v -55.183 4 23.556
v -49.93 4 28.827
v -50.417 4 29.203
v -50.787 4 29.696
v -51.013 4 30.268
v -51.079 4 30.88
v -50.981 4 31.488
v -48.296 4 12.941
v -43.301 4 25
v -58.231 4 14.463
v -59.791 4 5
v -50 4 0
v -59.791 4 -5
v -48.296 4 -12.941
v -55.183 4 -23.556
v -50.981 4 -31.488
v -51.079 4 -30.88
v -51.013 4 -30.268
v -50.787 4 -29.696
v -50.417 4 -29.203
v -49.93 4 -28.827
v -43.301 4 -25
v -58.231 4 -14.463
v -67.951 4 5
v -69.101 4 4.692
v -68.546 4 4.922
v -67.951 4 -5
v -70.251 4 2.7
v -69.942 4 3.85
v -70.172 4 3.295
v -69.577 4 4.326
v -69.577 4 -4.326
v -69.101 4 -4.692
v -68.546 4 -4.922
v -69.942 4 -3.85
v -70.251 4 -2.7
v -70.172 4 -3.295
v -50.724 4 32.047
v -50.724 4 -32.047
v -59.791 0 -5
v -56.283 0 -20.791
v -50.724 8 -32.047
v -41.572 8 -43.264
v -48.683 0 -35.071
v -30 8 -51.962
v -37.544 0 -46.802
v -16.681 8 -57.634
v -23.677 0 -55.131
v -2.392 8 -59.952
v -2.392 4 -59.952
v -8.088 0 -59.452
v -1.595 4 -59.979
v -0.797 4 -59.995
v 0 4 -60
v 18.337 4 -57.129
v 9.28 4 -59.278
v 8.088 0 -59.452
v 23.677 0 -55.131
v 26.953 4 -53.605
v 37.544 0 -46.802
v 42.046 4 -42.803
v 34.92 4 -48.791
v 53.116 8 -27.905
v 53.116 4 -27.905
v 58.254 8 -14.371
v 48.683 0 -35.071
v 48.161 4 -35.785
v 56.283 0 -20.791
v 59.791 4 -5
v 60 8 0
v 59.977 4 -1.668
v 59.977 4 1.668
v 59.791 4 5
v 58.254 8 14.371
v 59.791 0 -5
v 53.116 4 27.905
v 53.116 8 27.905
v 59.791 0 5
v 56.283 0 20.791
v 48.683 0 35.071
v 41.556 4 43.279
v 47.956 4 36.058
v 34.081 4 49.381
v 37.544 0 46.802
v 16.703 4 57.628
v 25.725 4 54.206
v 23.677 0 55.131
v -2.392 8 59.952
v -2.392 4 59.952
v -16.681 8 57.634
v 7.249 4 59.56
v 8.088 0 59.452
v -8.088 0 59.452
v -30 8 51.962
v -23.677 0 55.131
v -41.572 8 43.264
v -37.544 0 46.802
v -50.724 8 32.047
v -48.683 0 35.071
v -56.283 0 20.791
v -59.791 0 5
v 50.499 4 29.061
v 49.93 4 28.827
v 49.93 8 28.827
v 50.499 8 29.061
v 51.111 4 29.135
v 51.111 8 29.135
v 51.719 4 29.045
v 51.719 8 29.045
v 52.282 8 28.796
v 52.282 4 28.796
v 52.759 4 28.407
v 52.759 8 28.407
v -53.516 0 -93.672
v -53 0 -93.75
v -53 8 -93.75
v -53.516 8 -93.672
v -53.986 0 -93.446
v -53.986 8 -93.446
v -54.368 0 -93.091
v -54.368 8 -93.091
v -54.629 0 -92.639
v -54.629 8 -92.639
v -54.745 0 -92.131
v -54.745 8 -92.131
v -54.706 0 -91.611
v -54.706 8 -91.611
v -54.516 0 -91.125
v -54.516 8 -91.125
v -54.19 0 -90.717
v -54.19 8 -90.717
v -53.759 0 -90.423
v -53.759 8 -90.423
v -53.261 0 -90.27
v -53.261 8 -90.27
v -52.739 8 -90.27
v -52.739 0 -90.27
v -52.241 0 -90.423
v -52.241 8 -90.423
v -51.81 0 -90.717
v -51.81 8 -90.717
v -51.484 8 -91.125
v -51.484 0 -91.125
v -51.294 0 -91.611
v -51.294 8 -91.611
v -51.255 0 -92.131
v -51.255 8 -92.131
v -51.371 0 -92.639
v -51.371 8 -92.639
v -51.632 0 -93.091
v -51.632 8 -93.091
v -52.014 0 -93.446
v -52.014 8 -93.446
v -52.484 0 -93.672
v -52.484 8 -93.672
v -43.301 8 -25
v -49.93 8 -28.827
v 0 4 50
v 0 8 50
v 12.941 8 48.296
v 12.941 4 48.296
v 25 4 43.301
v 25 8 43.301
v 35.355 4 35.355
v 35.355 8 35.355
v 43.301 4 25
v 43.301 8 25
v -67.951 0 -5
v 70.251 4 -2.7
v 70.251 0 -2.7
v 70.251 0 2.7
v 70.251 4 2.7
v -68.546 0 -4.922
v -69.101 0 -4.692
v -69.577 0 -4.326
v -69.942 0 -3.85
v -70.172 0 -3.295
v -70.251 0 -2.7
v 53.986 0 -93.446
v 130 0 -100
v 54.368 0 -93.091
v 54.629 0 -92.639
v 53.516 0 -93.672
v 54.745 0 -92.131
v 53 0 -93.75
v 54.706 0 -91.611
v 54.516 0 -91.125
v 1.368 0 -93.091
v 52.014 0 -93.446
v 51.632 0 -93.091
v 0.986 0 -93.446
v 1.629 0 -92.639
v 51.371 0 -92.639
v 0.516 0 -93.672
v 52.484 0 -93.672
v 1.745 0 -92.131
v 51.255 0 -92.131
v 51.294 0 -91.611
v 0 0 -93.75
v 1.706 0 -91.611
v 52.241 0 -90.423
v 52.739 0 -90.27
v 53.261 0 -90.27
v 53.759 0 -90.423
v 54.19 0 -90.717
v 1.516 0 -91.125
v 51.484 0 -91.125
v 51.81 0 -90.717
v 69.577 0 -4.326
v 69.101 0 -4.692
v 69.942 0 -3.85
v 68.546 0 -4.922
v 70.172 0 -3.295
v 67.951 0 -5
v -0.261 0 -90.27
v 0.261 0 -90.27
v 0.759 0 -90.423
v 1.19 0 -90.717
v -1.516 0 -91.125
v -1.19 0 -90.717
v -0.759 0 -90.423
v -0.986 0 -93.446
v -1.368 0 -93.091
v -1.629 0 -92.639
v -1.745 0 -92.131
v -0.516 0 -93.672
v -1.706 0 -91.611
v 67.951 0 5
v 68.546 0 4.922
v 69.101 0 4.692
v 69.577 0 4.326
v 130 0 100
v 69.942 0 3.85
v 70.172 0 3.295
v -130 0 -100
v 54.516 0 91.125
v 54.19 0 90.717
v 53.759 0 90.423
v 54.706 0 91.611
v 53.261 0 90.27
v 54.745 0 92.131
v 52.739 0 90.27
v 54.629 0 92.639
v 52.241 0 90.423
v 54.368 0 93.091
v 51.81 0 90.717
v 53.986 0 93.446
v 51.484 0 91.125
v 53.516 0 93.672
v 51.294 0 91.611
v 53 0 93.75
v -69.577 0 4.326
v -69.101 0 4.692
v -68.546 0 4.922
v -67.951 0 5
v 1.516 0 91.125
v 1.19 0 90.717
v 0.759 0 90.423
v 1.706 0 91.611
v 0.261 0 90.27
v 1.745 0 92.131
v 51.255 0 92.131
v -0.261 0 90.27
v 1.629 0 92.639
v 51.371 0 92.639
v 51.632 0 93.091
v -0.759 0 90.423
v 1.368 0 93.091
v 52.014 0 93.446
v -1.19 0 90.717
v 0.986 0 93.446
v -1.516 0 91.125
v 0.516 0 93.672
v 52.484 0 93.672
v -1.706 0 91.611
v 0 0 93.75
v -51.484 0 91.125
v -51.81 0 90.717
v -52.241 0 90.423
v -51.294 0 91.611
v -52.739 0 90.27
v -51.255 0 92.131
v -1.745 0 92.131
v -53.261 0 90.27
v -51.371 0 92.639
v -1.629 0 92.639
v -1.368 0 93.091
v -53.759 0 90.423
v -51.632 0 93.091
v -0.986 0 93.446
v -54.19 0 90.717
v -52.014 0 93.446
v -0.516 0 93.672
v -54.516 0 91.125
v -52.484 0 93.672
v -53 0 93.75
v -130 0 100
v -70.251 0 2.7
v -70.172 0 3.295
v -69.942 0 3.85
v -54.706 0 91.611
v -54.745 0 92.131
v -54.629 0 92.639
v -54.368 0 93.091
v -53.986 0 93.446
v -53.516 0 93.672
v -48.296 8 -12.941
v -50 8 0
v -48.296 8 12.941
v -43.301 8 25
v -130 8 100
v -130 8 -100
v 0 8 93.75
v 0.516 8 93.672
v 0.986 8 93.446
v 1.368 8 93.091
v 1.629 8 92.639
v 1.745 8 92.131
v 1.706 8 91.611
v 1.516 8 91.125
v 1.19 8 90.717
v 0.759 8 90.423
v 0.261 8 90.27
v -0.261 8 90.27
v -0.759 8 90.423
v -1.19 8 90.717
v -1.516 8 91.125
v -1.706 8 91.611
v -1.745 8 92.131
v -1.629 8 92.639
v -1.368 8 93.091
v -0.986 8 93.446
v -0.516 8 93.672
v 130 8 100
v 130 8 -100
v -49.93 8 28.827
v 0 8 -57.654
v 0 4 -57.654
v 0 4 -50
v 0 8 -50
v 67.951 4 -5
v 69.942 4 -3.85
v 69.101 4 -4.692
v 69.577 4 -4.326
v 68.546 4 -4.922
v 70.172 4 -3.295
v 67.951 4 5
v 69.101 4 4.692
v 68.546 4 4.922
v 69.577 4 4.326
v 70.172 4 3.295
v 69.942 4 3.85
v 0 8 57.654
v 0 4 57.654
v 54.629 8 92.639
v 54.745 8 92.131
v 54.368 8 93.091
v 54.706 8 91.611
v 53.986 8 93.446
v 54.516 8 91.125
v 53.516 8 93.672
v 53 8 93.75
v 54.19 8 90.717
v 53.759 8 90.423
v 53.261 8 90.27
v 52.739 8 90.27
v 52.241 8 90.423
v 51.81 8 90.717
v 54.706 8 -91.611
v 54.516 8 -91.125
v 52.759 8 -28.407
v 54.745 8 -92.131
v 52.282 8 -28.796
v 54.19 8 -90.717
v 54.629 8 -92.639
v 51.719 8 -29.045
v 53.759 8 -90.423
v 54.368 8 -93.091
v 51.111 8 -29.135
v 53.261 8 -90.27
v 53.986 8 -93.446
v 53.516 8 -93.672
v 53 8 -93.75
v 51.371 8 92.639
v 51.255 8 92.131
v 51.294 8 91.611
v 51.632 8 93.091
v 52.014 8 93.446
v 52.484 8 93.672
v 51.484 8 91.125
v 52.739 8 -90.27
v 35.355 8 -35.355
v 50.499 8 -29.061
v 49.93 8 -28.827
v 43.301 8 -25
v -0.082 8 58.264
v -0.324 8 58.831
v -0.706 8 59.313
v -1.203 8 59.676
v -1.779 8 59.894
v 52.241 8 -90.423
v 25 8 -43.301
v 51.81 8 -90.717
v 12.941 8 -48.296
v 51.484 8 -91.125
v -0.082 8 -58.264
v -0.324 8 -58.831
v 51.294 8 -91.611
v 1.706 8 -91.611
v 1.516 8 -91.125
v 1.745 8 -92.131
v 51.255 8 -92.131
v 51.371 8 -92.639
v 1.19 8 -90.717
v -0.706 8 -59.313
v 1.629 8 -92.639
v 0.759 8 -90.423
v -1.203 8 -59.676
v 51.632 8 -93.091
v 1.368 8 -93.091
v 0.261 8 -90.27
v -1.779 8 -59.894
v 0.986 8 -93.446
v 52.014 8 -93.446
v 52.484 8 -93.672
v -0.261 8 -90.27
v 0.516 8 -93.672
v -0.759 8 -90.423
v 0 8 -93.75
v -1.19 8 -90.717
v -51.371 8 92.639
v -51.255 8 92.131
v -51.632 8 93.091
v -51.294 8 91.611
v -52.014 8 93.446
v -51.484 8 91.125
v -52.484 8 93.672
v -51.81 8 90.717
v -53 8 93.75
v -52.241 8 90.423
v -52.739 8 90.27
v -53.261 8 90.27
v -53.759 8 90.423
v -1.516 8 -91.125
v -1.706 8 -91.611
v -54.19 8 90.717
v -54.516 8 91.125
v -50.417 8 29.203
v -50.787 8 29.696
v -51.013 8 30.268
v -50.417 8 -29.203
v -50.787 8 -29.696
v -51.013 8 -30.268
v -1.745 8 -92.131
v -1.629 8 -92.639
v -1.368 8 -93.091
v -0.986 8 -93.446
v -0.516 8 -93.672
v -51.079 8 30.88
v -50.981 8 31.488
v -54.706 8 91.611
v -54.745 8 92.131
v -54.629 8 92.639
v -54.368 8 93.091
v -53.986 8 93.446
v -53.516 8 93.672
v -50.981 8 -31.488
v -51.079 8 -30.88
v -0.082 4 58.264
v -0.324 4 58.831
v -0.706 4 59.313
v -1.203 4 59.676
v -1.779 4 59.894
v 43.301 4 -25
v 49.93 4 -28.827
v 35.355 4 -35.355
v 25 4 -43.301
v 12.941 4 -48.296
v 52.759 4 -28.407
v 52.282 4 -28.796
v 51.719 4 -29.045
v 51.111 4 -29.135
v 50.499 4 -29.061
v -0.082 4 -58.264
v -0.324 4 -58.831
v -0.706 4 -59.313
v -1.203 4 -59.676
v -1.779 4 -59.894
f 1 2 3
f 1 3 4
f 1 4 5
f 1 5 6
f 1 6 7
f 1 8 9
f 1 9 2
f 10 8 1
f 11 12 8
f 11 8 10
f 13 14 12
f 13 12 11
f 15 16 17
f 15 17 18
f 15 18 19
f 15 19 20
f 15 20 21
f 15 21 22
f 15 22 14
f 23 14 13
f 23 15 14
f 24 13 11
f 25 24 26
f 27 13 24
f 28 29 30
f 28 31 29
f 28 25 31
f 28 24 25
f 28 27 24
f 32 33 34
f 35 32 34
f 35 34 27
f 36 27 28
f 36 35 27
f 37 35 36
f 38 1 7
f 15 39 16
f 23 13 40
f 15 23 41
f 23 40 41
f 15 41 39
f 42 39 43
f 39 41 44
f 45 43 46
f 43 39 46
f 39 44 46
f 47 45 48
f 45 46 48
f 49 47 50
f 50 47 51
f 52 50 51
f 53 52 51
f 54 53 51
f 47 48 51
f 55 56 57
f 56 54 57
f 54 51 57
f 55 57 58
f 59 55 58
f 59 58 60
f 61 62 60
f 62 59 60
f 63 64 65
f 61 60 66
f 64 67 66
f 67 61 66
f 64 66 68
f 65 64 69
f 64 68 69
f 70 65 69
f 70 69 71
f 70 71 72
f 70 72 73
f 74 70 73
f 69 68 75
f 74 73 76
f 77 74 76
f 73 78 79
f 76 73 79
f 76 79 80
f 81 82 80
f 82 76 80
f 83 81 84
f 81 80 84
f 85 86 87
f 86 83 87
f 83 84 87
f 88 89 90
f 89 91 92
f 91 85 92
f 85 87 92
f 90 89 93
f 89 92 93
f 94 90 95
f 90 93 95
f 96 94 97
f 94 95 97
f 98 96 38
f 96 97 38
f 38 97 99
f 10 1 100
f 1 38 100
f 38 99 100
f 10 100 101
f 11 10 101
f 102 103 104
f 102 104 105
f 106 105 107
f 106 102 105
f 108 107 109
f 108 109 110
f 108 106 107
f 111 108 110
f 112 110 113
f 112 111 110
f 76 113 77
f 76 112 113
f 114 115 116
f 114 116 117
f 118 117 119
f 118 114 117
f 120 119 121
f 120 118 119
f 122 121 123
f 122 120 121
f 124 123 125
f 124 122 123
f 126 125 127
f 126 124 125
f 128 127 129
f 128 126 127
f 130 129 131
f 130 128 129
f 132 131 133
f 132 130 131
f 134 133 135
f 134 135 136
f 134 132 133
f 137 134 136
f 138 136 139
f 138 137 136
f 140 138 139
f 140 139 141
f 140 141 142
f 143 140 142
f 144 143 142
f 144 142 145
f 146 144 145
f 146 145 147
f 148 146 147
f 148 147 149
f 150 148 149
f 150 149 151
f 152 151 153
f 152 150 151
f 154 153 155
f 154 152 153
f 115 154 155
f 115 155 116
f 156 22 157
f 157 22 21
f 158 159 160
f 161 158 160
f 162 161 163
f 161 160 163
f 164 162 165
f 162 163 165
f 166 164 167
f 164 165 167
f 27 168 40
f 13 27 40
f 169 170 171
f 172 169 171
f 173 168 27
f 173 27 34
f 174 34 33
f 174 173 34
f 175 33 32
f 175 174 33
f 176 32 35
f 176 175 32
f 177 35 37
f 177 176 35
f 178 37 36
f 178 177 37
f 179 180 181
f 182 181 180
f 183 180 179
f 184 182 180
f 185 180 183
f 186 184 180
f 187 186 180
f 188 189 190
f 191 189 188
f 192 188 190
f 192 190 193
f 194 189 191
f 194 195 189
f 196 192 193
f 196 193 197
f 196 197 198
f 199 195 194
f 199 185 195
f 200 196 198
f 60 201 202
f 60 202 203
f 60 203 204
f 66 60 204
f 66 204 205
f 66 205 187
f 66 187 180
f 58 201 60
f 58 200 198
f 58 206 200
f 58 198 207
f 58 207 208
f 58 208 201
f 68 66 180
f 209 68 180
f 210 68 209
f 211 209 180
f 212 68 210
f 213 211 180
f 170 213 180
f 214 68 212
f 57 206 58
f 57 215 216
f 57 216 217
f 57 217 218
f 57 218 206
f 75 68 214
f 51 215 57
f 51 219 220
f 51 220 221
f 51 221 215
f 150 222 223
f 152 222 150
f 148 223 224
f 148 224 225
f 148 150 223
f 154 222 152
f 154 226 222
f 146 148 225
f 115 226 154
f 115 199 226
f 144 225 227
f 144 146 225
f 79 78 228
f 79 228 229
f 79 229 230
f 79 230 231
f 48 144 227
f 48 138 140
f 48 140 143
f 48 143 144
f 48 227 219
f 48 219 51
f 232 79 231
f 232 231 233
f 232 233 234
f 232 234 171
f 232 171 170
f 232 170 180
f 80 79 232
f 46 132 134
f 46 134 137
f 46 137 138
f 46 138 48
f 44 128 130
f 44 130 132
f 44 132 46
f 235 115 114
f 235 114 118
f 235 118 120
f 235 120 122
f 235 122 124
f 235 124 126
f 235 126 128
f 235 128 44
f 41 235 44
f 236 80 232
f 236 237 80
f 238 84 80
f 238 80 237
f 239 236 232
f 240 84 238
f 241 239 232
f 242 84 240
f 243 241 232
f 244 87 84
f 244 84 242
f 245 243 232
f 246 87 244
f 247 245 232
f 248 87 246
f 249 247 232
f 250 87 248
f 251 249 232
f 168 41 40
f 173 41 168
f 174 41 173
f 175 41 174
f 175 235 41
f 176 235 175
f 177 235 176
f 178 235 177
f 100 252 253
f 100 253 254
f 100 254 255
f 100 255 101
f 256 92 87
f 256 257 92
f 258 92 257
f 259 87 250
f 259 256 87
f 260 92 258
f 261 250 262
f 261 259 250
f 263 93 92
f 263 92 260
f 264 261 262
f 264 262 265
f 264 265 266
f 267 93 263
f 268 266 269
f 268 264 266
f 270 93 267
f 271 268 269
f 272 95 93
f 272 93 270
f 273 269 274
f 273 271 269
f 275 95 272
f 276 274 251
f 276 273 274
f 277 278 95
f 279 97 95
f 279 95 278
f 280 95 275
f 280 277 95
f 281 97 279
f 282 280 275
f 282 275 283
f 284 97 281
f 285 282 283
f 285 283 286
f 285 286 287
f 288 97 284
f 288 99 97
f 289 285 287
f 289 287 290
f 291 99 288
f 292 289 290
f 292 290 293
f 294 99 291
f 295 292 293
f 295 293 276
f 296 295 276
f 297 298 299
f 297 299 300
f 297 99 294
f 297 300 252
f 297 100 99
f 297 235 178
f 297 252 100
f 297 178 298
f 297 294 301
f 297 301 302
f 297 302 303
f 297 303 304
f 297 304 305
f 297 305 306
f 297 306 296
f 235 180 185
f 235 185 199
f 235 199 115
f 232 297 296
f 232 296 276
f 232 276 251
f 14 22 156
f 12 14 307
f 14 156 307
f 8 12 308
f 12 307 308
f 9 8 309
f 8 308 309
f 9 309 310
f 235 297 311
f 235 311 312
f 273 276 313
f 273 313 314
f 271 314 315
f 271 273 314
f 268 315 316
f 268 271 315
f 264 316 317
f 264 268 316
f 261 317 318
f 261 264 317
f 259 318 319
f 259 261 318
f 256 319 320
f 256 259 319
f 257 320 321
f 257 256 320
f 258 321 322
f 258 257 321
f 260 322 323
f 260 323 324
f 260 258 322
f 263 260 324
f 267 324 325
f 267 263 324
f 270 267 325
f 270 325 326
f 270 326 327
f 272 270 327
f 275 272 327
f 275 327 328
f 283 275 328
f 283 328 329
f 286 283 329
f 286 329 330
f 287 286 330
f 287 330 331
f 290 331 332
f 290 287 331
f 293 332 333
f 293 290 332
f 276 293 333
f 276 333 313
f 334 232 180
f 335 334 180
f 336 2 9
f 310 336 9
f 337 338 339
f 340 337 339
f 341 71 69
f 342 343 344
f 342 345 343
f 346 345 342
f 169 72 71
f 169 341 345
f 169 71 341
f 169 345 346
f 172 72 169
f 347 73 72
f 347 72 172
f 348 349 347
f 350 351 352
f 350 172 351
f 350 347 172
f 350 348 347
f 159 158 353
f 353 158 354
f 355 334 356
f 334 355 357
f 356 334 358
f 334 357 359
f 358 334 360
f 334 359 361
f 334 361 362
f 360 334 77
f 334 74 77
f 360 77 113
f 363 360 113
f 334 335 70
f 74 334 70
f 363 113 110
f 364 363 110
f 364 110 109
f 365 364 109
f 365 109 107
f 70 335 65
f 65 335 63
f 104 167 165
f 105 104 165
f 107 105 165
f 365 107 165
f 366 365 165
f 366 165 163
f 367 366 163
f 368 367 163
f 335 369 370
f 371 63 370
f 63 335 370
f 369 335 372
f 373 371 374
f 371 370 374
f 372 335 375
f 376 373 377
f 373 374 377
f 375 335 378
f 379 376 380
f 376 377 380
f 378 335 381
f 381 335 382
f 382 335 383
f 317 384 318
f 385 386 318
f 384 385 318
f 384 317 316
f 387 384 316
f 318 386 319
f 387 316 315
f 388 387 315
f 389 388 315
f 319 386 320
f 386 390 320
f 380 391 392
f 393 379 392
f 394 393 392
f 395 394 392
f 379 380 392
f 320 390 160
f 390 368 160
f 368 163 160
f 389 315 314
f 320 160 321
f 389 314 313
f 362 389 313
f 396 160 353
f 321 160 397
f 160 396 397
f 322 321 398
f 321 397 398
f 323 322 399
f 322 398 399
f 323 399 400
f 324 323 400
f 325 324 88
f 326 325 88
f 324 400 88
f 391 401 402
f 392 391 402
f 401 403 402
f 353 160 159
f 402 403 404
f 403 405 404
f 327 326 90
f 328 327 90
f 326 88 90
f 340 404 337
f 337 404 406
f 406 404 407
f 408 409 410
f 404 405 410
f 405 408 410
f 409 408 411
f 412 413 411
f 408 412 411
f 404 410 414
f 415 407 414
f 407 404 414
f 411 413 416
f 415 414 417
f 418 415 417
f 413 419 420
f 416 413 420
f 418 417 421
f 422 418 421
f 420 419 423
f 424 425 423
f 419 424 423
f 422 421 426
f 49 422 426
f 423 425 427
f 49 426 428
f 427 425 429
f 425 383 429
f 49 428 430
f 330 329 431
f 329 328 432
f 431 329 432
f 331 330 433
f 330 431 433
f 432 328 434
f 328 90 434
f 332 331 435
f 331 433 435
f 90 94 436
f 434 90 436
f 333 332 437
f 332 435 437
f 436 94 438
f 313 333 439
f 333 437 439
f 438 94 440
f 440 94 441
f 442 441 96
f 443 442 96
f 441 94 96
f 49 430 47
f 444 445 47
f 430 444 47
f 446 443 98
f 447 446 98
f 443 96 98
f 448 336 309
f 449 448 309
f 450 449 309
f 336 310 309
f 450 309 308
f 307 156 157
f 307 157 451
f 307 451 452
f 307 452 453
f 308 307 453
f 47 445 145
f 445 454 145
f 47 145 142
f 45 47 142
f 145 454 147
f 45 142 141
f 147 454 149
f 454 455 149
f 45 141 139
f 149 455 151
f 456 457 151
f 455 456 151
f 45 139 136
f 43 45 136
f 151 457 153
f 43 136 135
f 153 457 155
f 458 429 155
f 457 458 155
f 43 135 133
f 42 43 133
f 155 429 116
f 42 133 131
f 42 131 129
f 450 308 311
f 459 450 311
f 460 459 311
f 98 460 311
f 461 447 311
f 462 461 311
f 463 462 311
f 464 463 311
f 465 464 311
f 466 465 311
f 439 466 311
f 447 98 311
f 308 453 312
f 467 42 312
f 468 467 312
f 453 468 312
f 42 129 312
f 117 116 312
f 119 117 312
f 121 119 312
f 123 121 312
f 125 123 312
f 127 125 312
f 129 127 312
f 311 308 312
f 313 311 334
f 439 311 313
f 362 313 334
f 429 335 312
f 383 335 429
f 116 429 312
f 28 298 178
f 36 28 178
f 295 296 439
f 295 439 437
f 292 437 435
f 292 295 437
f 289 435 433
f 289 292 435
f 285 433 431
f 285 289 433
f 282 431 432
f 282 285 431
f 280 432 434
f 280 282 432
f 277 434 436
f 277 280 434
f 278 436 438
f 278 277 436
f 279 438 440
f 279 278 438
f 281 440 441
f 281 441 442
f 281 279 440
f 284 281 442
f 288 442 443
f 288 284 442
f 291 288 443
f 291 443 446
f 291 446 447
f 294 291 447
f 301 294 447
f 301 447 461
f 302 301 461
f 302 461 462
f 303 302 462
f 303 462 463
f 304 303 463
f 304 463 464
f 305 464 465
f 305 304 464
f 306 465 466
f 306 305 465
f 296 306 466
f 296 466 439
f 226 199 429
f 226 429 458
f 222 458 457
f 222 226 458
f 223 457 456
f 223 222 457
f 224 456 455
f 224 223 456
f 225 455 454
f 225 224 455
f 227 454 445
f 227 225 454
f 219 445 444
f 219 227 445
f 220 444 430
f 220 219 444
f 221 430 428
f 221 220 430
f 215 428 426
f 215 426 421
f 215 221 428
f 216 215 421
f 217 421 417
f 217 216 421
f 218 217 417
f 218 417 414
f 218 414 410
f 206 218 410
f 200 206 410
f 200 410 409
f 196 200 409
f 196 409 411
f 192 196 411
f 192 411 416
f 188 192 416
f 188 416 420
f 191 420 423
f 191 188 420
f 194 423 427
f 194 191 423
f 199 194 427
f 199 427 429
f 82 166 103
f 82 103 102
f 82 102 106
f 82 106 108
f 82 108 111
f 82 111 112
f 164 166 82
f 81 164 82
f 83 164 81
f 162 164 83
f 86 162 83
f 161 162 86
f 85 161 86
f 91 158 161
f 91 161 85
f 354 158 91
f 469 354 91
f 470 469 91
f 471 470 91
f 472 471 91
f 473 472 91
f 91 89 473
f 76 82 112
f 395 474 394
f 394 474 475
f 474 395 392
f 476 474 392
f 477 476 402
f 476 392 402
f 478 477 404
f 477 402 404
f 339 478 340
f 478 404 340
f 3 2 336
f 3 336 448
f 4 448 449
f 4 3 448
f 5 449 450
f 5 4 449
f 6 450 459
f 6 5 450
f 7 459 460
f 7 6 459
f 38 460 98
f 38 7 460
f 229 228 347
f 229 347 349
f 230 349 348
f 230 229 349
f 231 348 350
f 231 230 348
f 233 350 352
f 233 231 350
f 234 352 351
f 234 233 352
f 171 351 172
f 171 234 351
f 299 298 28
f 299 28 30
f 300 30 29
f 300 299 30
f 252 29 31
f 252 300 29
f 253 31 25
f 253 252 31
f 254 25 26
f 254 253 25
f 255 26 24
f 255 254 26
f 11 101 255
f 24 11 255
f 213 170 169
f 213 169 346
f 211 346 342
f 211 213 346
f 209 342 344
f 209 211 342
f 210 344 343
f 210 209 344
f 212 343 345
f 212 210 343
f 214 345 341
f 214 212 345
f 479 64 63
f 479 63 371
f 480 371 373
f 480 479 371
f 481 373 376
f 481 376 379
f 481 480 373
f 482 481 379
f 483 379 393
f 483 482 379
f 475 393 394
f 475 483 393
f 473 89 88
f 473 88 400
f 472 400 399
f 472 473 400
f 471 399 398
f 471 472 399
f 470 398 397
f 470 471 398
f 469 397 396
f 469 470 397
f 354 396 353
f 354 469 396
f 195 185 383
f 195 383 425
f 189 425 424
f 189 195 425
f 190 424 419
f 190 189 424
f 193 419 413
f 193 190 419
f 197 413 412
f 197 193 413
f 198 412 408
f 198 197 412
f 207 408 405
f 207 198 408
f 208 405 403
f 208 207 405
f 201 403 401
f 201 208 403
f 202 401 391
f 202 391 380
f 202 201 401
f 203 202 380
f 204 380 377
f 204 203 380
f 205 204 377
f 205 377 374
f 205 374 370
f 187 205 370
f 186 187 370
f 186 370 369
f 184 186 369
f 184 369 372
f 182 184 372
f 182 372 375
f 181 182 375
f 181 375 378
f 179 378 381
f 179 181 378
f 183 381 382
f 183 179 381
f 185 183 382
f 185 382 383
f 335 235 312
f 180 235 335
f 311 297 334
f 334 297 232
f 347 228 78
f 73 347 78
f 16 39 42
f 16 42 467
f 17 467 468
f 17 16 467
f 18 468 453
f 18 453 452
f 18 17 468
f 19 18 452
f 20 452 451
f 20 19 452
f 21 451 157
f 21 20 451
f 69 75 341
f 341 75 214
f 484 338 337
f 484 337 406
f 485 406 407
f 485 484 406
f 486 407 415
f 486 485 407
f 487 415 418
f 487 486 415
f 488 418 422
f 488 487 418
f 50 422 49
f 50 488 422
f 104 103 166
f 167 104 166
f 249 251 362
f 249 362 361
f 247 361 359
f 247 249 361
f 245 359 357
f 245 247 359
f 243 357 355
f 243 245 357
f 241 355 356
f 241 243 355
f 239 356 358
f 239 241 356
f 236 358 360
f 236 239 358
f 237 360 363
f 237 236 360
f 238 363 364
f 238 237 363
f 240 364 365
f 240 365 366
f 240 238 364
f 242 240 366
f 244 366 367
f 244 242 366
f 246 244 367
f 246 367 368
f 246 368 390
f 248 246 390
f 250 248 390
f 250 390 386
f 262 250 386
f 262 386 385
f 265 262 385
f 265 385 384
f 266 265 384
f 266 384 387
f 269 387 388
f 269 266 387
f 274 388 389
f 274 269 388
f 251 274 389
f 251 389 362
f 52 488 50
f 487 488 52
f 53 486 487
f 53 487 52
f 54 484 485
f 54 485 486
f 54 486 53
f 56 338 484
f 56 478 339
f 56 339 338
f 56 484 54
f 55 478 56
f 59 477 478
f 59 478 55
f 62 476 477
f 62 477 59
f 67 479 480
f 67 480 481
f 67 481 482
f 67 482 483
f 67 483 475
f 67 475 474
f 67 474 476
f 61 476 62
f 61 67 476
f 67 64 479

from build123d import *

# Parameters (mm, degrees)
SKIZZE1_W                       = 260
SKIZZE1_H                       = 200
SKIZZE1_R                       = 1.749999999999997
SKIZZE1_R_2                     = 1.7500000000000038
SKIZZE1_R_3                     = 1.7500000000000042
AUFSATZ_LINEAR_AUSTRAGEN1_DEPTH = 8
SKIZZE2_R                       = 50
SCHNITT_LINEAR_AUSTRAGEN1_DEPTH = 8
SCHNITT_LINEAR_AUSTRAGEN4_DEPTH = 165.2071862008481
SCHNITT_LINEAR_AUSTRAGEN5_DEPTH = 4
VERRUNDUNG1_R                   = 2.3


with BuildPart() as part:
    # Skizze1 → Aufsatz-Linear austragen1 (new body)
    with BuildSketch(Plane(origin=(0, 0, 0), x_dir=(1, 0, 0), z_dir=(0, 1, 0))):
        Rectangle(SKIZZE1_W, SKIZZE1_H)
        with Locations(Location((-53, -92, 0), (0, 0, 270))):
            Circle(SKIZZE1_R, mode=Mode.SUBTRACT)
        with Locations(Location((53, -92, 0), (0, 0, 270))):
            Circle(SKIZZE1_R_2, mode=Mode.SUBTRACT)
        with Locations(Location((0, -92, 0), (0, 0, 270))):
            Circle(SKIZZE1_R_3, mode=Mode.SUBTRACT)
        with Locations(Location((-5.551e-14, 91.99999999999991, 0), (0, 0, 90))):
            Circle(SKIZZE1_R_3, mode=Mode.SUBTRACT)
        with Locations(Location((52.99999999999994, 91.99999999999991, 0), (0, 0, 90))):
            Circle(SKIZZE1_R_2, mode=Mode.SUBTRACT)
        with Locations(Location((-53.00000000000003, 91.99999999999989, 0), (0, 0, 90))):
            Circle(SKIZZE1_R, mode=Mode.SUBTRACT)
    extrude(amount=AUFSATZ_LINEAR_AUSTRAGEN1_DEPTH)

    # Skizze2 → Schnitt-Linear austragen1 (cut)
    with BuildSketch(Plane(origin=(0, 8, 0), x_dir=(1, 0, 0), z_dir=(0, 1, 0))):
        with Locations(Location((0, 0, 0), (0, 0, 270))):
            Circle(SKIZZE2_R)
    extrude(amount=-SCHNITT_LINEAR_AUSTRAGEN1_DEPTH, mode=Mode.SUBTRACT)

    # Skizze3 → Schnitt-Linear austragen4 (cut, through all)
    with BuildSketch(Plane.XZ):
        with BuildLine():
            ThreePointArc((60.00000000000001, 0), (59.947803224682126, 2.5021767593021864), (59.79130371550694, 5.000000000000675))
            Line((59.791303715506885, 5), (49.749371855331, 5))
            ThreePointArc((49.749371855331006, 5.000000000000001), (49.937303655516644, 2.503138752990944), (50.00000000000001, 0))
            ThreePointArc((50.00000000000001, -1.225e-14), (49.937303655516644, -2.503138752990955), (49.749371855331006, -5.00000000000001))
            Line((49.749371855331, -5), (59.791303715506885, -5))
            ThreePointArc((59.79130371550694, -5.0000000000006795), (59.947803224682126, -2.5021767593021957), (60.00000000000001, -1.47e-14))
        make_face()
        with BuildLine():
            ThreePointArc((59.79130371550694, 5.000000000000675), (57.257520364495285, 17.932550340356187), (51.961524227066455, 29.99999999999978))
            Line((51.961524227066455, 29.99999999999978), (43.30127018922205, 24.999999999999826))
            ThreePointArc((43.301270189222045, 24.999999999999822), (47.58787131429482, 15.342571615414302), (49.749371855331006, 5.000000000000001))
            Line((49.749371855331, 5), (59.791303715506885, 5))
        make_face()
        with BuildLine():
            Line((59.791303715506885, -5), (49.749371855331, -5))
            ThreePointArc((49.749371855331006, -5.00000000000001), (47.58787131429479, -15.342571615414398), (43.301270189221945, -24.999999999999986))
            Line((43.301270189221945, -24.999999999999993), (51.961524227066334, -29.999999999999993))
            ThreePointArc((51.961524227066334, -29.999999999999982), (57.25752036449525, -17.932550340356304), (59.79130371550694, -5.0000000000006795))
        make_face()
        with BuildLine():
            Line((-43.30127018922192, -25.00000000000002), (-51.961524227066306, -30.00000000000003))
            ThreePointArc((-51.96152422706632, -30.00000000000001), (-30.000000000000117, -51.961524227066256), (-2.7748e-13, -60.00000000000001))
            Line((-2.4633e-13, -60.00000000000001), (-1.9949e-13, -50.00000000000001))
            ThreePointArc((-1.8682e-13, -50.00000000000001), (-25.000000000000064, -43.3012701892219), (-43.30127018922194, -25.00000000000001))
        make_face()
        with BuildLine():
            ThreePointArc((3.67e-15, 60.00000000000001), (-29.999999999999876, 51.9615242270664), (-51.961524227066185, 30.000000000000256))
            Line((-51.961524227066185, 30.000000000000245), (-43.30127018922183, 25.0000000000002))
            ThreePointArc((-43.30127018922182, 25.000000000000213), (-24.999999999999897, 43.301270189221995), (3.06e-15, 50.00000000000001))
            Line((0, 50), (0, 60.00000000000001))
        make_face()
    extrude(amount=-SCHNITT_LINEAR_AUSTRAGEN4_DEPTH, mode=Mode.SUBTRACT)

    # Skizze3<5> → Schnitt-Linear austragen5 (cut)
    with BuildSketch(Plane.XZ):
        with BuildLine():
            Line((70.25062814466901, 5), (59.791303715506885, 5))
            ThreePointArc((59.79130371550694, 5.000000000000675), (59.947803224682126, 2.5021767593021864), (60.00000000000001, 0))
            ThreePointArc((60.00000000000001, -1.47e-14), (59.947803224682126, -2.5021767593021957), (59.79130371550694, -5.0000000000006795))
            Line((59.791303715506885, -5), (70.25062814466901, -5))
            Line((70.25062814466901, -5), (70.25062814466901, 5))
        make_face()
        with BuildLine():
            ThreePointArc((-59.79130371550711, -4.999999999998586), (-60.00000000000001, 7.35e-15), (-59.79130371550711, 4.999999999998601))
            Line((-59.791303715507226, 5), (-70.25062814466901, 5))
            Line((-70.25062814466901, 5), (-70.25062814466901, -5))
            Line((-70.25062814466901, -5), (-59.791303715507226, -5))
        make_face()
        with BuildLine():
            Line((-49.749371855331, -5), (-59.791303715507226, -5))
            ThreePointArc((-59.79130371550711, -4.999999999998586), (-57.257520364495555, -17.932550340355316), (-51.96152422706632, -30.00000000000001))
            Line((-51.961524227066306, -30.00000000000003), (-43.30127018922192, -25.00000000000002))
            ThreePointArc((-43.30127018922194, -25.00000000000001), (-47.58787131429479, -15.342571615414402), (-49.749371855331006, -4.999999999999992))
        make_face()
        with BuildLine():
            Line((-49.749371855331, 5), (-59.791303715507226, 5))
            ThreePointArc((-59.79130371550711, 4.999999999998601), (-60.00000000000001, 7.35e-15), (-59.79130371550711, -4.999999999998586))
            Line((-59.791303715507226, -5), (-49.749371855331, -5))
            ThreePointArc((-49.749371855331006, -4.999999999999992), (-50.00000000000001, 6.12e-15), (-49.749371855331006, 5.000000000000004))
        make_face()
        with BuildLine():
            Line((-43.30127018922183, 25.0000000000002), (-51.961524227066185, 30.000000000000245))
            ThreePointArc((-51.961524227066185, 30.000000000000256), (-57.25752036449551, 17.932550340355455), (-59.79130371550711, 4.999999999998601))
            Line((-59.791303715507226, 5), (-49.749371855331, 5))
            ThreePointArc((-49.749371855331006, 5.000000000000004), (-47.58787131429475, 15.342571615414519), (-43.30127018922182, 25.000000000000213))
        make_face()
        with BuildLine():
            ThreePointArc((51.961524227066455, 29.99999999999978), (30.00000000000011, 51.96152422706626), (3.67e-15, 60.00000000000001))
            Line((0, 60.00000000000001), (0, 50))
            ThreePointArc((3.06e-15, 50.00000000000001), (25.000000000000092, 43.30127018922189), (43.301270189222045, 24.99999999999982))
            Line((43.30127018922205, 24.999999999999826), (51.961524227066455, 29.99999999999978))
        make_face()
        with BuildLine():
            Line((-1.9949e-13, -50.00000000000001), (-2.4633e-13, -60.00000000000001))
            ThreePointArc((-2.7748e-13, -60.00000000000001), (29.99999999999987, -51.9615242270664), (51.961524227066334, -29.999999999999982))
            Line((51.961524227066334, -29.999999999999993), (43.301270189221945, -24.999999999999993))
            ThreePointArc((43.301270189221945, -24.999999999999986), (24.999999999999932, -43.30127018922198), (-1.8682e-13, -50.00000000000001))
        make_face()
    extrude(amount=-SCHNITT_LINEAR_AUSTRAGEN5_DEPTH, mode=Mode.SUBTRACT)

    # Verrundung1
    # the kernel refuses this fillet: 2.3 mm, written as the material it adds along each edge
    with BuildSketch(Plane(origin=(70.25062814466901, 0, 5), x_dir=(0, 0, -1), z_dir=(0, 1, 0))) as verrundung1_piece_1:
        with BuildLine():
            CenterArc((VERRUNDUNG1_R, VERRUNDUNG1_R), VERRUNDUNG1_R, 180, 90)
            Line((-8.9e-16, VERRUNDUNG1_R), (0, 0))
            Line((0, 0), (VERRUNDUNG1_R, 0))
        make_face()
    extrude(amount=4)
    with BuildSketch(Plane(origin=(70.25062814466901, 0, -5), x_dir=(-1, 0, 0), z_dir=(0, 1, 0))) as verrundung1_piece_2:
        with BuildLine():
            CenterArc((VERRUNDUNG1_R, VERRUNDUNG1_R), VERRUNDUNG1_R, 180, 90)
            Line((0, VERRUNDUNG1_R), (0, 0))
            Line((0, 0), (VERRUNDUNG1_R, 0))
        make_face()
    extrude(amount=4)
    with BuildSketch(Plane(origin=(-70.25062814466901, 0, -5), x_dir=(1, 0, 0), z_dir=(0, 1, 0))) as verrundung1_piece_3:
        with BuildLine():
            CenterArc((VERRUNDUNG1_R, -VERRUNDUNG1_R), VERRUNDUNG1_R, 90, 89.99999999999997)
            Line((0, -VERRUNDUNG1_R), (0, 0))
            Line((0, 0), (VERRUNDUNG1_R, 0))
        make_face()
    extrude(amount=4)
    with BuildSketch(Plane(origin=(-70.25062814466901, 0, 5), x_dir=(0, 0, -1), z_dir=(0, 1, 0))) as verrundung1_piece_4:
        with BuildLine():
            CenterArc((VERRUNDUNG1_R, -VERRUNDUNG1_R), VERRUNDUNG1_R, 90, 90)
            Line((0, -VERRUNDUNG1_R), (0, 0))
            Line((0, 0), (VERRUNDUNG1_R, 0))
        make_face()
    extrude(amount=4)
    with BuildSketch(Plane(origin=(51.96152422706646, 4, 29.99999999999978), x_dir=(0.48263674044551186, 0, -0.8758206304787137), z_dir=(0, 1, 0))) as verrundung1_piece_5:
        with BuildLine():
            CenterArc((2.346306800066914, 2.2995429563643968), VERRUNDUNG1_R, 178.8577537601654, 92.2844924796575)
            Line((0.04676384370252609, 2.345392621956658), (0, 0))
            ThreePointArc((0, 0), (1.1960782328293844, -0.01192287745045764), (2.392156465658705, -7e-17))
        make_face()
    extrude(amount=4)
    with BuildSketch(Plane(origin=(51.961524227066334, 4, -29.99999999999999), x_dir=(-0.8660254037844398, 0, 0.499999999999998), z_dir=(0, 1, 0))) as verrundung1_piece_6:
        with BuildLine():
            CenterArc((2.345858778401576, 2.2999999999999994), VERRUNDUNG1_R, 177.71550752035841, 92.2844924796417)
            ThreePointArc((0.04768677130146285, 2.3916811091852797), (0.011922877450426, 1.1960782328291542), (0, 0))
            Line((0, 0), (2.34585877840158, -4e-17))
        make_face()
    extrude(amount=4)
    with BuildSketch(Plane(origin=(-51.96152422706631, 4, -30.00000000000002), x_dir=(0.8660254037844404, 0, 0.49999999999999717), z_dir=(0, 1, 0))) as verrundung1_piece_7:
        with BuildLine():
            CenterArc((2.3458587784015195, 2.2999999999999994), VERRUNDUNG1_R, 177.71550752035327, 92.28449247964659)
            ThreePointArc((0.04768677130141288, 2.3916811091854857), (0.01192287745041601, 1.196078232829249), (0, 0))
            Line((0, 0), (2.3458587784015132, -4e-17))
        make_face()
    extrude(amount=4)
    with BuildSketch(Plane(origin=(-2.6083e-13, 4, -60), x_dir=(1.086e-14, 0, 1), z_dir=(0, 1, 0))) as verrundung1_piece_8:
        with BuildLine():
            CenterArc((2.3458587784010057, -2.3), VERRUNDUNG1_R, 89.99999999999973, 92.28449247964573)
            ThreePointArc((0.04768677130089817, -2.3916811091854364), (0.01192287745039645, -1.1960782328292843), (0, 0))
            Line((0, 0), (2.3458587784010163, 0))
        make_face()
    extrude(amount=4)
    with BuildSketch(Plane(origin=(1.84e-15, 4, 60.00000000000001), x_dir=(-7.8e-16, 0, -1), z_dir=(0, 1, 0))) as verrundung1_piece_9:
        with BuildLine():
            CenterArc((2.3458587784015865, 2.3), VERRUNDUNG1_R, 177.71550752035446, 92.28449247964545)
            ThreePointArc((0.04768677130148023, 2.3916811091854395), (0.011922877450453, 1.1960782328292412), (0, 0))
            Line((0, 0), (2.3458587784015847, 0))
        make_face()
    extrude(amount=4)
    with BuildSketch(Plane(origin=(-51.961524227066185, 4, 30.00000000000025), x_dir=(0.8660254037844354, 0, -0.5000000000000054), z_dir=(0, 1, 0))) as verrundung1_piece_10:
        with BuildLine():
            CenterArc((2.3458587784015092, -2.3), VERRUNDUNG1_R, 90, 92.28449247965011)
            ThreePointArc((0.04768677130141038, -2.3916811091856207), (0.0119228774504358, -1.1960782328293367), (0, 0))
            Line((0, 0), (2.3458587784015092, -2e-16))
        make_face()
    extrude(amount=4)


solid = part.part
